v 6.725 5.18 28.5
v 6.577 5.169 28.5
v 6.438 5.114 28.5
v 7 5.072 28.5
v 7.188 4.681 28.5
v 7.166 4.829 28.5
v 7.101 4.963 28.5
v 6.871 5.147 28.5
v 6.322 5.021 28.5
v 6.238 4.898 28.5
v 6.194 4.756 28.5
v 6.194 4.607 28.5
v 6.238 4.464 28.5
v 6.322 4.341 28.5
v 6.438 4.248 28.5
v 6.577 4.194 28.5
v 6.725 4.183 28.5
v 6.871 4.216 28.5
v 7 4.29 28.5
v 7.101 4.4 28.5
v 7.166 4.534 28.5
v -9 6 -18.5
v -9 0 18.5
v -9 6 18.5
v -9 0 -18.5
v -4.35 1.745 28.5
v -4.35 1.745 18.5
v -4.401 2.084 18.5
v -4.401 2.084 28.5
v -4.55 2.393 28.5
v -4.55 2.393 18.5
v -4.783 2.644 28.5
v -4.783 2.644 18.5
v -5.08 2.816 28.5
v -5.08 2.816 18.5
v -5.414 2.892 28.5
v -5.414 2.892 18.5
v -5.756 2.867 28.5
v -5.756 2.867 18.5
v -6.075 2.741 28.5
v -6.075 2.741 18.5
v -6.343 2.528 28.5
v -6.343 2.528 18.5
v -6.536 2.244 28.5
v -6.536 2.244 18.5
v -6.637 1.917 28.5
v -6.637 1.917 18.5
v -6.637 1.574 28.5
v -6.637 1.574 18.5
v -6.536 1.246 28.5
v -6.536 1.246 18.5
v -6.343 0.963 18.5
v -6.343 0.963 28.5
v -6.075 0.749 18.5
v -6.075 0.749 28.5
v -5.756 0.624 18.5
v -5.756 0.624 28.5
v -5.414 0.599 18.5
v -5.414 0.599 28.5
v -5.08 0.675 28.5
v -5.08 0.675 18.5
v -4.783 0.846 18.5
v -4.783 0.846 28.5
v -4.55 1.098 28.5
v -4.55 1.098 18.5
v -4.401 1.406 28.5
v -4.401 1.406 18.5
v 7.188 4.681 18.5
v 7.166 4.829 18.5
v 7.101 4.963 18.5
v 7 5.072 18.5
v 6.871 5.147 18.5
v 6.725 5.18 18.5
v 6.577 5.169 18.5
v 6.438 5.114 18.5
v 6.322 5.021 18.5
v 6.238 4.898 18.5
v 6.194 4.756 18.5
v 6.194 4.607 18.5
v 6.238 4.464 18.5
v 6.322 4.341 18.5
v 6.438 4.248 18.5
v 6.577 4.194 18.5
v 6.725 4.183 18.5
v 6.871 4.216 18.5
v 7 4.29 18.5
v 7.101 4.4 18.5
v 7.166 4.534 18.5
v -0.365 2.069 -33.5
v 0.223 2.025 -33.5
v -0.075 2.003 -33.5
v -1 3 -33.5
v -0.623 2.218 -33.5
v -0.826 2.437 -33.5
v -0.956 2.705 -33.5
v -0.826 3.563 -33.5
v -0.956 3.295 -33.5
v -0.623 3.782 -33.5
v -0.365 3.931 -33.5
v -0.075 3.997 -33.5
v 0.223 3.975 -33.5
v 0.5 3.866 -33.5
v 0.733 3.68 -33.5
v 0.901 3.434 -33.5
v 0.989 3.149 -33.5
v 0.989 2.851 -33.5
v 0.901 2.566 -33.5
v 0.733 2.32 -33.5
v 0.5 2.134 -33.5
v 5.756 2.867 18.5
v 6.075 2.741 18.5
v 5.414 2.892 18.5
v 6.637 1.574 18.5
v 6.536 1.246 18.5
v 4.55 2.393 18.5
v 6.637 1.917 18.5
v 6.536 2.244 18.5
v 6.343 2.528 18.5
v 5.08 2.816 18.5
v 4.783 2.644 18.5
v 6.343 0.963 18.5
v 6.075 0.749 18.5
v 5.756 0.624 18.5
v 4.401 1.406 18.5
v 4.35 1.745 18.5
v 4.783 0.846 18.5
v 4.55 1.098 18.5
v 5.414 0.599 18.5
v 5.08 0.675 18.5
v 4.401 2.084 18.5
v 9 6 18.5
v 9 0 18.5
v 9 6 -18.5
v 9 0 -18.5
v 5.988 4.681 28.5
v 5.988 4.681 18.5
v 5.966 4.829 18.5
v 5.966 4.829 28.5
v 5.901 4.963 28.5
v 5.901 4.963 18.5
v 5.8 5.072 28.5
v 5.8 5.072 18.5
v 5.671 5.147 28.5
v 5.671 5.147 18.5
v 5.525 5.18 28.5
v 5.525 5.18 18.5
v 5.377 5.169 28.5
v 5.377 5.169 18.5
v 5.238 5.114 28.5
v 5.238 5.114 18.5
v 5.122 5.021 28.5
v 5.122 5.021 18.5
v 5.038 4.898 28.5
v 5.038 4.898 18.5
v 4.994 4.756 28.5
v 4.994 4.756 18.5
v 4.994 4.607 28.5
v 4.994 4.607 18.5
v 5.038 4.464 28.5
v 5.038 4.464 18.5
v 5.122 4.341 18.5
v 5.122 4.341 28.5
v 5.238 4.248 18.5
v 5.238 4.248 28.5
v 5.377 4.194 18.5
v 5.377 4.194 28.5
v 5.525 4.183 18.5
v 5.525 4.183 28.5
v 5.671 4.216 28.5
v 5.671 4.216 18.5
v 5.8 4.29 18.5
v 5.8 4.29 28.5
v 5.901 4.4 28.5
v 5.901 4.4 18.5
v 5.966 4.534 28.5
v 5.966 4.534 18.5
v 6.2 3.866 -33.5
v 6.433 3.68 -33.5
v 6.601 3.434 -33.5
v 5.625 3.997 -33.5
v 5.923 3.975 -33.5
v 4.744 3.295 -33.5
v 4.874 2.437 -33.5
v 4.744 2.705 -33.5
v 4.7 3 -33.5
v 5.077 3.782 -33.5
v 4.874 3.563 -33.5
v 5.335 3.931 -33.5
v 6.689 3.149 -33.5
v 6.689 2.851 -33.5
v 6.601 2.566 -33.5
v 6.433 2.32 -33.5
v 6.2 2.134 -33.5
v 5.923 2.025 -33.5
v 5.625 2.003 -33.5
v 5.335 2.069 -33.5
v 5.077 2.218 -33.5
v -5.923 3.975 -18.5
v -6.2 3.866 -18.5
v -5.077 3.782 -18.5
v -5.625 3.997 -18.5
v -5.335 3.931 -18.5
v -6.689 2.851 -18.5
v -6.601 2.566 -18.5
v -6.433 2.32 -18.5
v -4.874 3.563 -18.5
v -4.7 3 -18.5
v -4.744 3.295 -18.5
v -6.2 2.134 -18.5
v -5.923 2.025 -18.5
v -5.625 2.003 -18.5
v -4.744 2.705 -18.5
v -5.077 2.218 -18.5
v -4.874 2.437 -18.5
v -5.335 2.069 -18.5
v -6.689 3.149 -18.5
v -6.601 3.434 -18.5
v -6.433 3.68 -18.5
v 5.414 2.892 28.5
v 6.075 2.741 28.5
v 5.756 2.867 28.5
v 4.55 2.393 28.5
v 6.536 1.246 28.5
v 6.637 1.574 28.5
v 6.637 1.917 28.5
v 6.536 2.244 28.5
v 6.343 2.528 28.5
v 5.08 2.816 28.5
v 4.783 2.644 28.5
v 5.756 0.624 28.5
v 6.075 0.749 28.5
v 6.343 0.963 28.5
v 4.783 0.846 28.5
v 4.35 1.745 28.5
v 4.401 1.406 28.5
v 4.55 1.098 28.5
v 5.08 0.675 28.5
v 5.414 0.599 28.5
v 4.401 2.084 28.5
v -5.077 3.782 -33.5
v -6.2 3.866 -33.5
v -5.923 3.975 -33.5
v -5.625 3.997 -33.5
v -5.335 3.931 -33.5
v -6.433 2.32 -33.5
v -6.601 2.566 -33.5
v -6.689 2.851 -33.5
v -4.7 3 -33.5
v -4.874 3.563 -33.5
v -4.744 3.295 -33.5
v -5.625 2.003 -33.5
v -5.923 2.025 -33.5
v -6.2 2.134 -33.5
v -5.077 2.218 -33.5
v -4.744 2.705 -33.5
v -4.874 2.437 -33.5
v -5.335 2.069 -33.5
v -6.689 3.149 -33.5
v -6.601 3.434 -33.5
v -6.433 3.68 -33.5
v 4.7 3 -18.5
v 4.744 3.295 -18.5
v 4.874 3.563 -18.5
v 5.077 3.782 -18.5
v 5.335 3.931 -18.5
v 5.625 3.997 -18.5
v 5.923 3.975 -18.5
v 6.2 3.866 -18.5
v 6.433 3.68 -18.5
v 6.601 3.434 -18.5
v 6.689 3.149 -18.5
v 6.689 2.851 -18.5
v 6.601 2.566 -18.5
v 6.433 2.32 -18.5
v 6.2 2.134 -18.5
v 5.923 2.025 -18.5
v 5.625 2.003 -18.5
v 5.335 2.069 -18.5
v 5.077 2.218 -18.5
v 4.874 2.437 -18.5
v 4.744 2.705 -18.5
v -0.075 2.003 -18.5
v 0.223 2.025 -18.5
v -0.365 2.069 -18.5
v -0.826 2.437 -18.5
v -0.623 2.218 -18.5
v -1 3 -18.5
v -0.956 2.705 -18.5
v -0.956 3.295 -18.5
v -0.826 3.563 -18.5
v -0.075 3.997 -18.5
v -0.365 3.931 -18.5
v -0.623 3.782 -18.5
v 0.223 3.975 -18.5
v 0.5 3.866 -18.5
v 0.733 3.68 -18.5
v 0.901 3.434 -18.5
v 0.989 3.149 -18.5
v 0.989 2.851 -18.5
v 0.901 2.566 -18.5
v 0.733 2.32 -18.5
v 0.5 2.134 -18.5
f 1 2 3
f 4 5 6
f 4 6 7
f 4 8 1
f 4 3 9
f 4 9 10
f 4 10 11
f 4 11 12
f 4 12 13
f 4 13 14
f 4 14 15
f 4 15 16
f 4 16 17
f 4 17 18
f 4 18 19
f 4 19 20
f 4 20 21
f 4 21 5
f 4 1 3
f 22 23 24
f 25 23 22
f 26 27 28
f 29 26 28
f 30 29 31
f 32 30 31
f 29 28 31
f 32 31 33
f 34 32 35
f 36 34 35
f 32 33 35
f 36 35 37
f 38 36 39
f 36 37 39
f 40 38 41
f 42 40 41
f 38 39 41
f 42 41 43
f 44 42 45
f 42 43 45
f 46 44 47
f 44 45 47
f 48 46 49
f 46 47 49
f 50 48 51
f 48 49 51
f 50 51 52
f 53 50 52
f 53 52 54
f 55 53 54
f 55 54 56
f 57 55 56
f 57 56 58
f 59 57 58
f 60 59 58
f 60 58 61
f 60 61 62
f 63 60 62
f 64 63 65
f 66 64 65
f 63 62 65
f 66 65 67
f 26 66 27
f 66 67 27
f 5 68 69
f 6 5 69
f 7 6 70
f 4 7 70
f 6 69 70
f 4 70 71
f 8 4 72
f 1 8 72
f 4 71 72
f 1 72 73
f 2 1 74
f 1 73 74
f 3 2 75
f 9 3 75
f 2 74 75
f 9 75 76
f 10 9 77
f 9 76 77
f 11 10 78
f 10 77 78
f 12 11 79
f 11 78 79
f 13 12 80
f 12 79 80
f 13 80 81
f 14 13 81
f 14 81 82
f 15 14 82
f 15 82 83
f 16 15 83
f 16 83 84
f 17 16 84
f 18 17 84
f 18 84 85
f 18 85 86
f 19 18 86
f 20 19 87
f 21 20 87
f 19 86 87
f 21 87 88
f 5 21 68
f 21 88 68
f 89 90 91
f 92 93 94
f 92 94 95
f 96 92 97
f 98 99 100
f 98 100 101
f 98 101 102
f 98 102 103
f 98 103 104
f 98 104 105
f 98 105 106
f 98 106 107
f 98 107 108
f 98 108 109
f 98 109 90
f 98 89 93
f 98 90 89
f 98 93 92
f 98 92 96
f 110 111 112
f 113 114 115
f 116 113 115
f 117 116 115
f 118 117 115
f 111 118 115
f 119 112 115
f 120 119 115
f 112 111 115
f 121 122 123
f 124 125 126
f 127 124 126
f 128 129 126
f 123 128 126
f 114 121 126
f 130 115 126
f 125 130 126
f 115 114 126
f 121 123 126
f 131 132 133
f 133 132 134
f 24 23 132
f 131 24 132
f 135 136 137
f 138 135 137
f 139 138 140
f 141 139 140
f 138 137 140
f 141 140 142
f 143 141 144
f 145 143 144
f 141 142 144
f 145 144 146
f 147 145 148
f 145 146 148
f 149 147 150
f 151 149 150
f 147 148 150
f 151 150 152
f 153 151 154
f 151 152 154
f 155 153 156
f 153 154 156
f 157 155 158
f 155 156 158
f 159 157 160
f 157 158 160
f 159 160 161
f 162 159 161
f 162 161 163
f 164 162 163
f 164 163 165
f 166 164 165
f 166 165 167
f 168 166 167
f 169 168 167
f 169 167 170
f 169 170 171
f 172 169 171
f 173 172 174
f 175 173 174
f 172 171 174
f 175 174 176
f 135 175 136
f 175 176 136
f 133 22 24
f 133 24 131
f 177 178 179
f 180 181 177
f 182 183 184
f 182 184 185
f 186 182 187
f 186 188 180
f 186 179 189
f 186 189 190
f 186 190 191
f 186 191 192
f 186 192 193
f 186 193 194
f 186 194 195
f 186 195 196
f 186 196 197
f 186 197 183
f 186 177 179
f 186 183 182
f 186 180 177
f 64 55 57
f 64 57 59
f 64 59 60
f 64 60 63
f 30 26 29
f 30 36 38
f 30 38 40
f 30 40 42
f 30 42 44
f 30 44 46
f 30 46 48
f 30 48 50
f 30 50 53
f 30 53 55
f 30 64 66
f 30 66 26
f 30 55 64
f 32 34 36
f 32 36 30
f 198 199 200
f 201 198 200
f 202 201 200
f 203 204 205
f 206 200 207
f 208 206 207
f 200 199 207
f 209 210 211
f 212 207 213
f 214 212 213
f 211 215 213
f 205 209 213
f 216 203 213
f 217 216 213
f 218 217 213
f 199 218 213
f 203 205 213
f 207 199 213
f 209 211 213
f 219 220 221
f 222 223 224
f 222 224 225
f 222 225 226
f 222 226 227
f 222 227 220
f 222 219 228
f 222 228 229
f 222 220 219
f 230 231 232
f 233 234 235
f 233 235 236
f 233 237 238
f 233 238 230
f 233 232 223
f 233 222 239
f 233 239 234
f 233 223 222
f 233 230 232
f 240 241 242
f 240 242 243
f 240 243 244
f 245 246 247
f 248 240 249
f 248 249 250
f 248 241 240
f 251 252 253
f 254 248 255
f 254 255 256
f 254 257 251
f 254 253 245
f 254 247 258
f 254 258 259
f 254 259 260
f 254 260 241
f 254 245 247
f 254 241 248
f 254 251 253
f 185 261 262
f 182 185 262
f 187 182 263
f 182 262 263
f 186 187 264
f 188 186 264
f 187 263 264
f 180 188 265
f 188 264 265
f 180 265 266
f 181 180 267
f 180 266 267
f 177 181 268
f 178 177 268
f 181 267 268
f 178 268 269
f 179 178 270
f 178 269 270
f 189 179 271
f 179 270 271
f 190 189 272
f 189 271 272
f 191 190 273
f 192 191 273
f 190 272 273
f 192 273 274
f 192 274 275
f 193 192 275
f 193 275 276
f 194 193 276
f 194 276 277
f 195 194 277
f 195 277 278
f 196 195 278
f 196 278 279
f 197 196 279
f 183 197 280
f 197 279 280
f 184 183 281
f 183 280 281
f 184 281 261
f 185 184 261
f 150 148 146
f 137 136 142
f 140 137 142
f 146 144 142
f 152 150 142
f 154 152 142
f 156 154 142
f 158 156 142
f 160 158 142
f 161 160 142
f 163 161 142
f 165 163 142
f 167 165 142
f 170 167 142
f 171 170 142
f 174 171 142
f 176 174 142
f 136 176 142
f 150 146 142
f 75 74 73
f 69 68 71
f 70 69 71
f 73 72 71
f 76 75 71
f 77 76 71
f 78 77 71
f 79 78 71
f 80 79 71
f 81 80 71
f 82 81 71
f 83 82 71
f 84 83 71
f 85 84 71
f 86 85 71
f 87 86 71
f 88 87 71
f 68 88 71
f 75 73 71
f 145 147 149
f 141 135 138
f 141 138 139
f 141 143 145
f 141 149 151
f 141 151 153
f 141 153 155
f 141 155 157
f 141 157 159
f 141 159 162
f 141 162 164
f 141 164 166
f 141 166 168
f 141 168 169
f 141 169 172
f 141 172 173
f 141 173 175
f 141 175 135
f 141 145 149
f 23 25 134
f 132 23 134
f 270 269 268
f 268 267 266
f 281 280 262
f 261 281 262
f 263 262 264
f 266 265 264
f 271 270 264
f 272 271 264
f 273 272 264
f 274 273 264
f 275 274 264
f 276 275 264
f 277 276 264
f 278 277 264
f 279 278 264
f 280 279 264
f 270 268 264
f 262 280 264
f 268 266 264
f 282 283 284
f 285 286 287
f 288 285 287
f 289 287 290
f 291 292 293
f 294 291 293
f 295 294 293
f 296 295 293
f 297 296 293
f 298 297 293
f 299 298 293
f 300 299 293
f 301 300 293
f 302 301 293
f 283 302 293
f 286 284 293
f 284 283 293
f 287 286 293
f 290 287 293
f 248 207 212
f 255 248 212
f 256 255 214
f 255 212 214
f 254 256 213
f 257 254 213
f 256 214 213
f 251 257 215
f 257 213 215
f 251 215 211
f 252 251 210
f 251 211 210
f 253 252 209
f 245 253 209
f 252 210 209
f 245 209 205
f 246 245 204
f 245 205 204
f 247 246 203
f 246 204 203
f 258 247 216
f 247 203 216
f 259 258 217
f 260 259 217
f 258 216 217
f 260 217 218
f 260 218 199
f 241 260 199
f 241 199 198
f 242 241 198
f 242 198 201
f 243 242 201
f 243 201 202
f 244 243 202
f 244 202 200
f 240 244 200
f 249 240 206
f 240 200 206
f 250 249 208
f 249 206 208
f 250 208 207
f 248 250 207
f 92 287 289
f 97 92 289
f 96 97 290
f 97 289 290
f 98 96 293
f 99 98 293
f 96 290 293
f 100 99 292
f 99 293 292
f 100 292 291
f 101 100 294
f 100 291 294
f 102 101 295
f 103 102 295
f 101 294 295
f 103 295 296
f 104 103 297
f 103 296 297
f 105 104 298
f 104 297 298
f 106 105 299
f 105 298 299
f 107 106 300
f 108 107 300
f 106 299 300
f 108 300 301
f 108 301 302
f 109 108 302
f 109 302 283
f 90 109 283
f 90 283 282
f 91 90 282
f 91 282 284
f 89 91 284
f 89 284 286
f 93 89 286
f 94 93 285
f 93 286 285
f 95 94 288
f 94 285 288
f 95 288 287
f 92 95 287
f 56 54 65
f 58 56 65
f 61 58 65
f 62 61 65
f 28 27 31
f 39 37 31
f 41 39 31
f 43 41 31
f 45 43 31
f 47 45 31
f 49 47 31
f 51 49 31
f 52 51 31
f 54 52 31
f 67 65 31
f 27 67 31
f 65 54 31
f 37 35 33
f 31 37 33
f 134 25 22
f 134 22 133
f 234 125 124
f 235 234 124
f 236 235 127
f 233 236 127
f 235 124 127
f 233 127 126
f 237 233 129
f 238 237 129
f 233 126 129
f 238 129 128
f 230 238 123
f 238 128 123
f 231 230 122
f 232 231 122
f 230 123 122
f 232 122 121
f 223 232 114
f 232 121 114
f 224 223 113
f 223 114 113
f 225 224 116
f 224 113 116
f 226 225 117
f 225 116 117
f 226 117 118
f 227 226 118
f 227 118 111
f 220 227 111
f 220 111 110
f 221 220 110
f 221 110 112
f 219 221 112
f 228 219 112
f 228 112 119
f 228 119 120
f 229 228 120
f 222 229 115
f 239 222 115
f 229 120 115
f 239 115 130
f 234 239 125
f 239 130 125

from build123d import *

# Parameters (mm, degrees)
ESQUISSE1_W          = 18
ESQUISSE1_H          = 37
BOSS_EXTRU_1_DEPTH   = 6
ESQUISSE2_R          = 1.15
BOSS_EXTRU_2_DEPTH   = 10
BOSS_EXTRU_2_2_DEPTH = 10
ESQUISSE2_R_2        = 0.5
BOSS_EXTRU_2_3_DEPTH = 10
BOSS_EXTRU_2_4_DEPTH = 10
ESQUISSE3_R          = 1
BOSS_EXTRU_3_DEPTH   = 15
BOSS_EXTRU_3_2_DEPTH = 15
BOSS_EXTRU_3_3_DEPTH = 15


with BuildPart() as part:
    # Esquisse1 → Boss.-Extru.1 (new body)
    with BuildSketch(Plane(origin=(0, 0, 0), x_dir=(1, 0, 0), z_dir=(0, 1, 0))):
        Rectangle(ESQUISSE1_W, ESQUISSE1_H)
    extrude(amount=BOSS_EXTRU_1_DEPTH)


with BuildPart() as body_2:
    # Esquisse2 → Boss.-Extru.2 (new body)
    with BuildSketch(Plane.XY.offset(18.5)):
        with Locations((-5.5, 1.745362632)):
            Circle(ESQUISSE2_R)
    extrude(amount=BOSS_EXTRU_2_DEPTH)


with BuildPart() as body_3:
    # Esquisse2 → Boss.-Extru.2 2 (new body)
    with BuildSketch(Plane.XY.offset(18.5)):
        with Locations(Location((5.5, 1.745362632, 0), (0, 0, 180))):
            Circle(ESQUISSE2_R)
    extrude(amount=BOSS_EXTRU_2_2_DEPTH)


with BuildPart() as body_4:
    # Esquisse2 → Boss.-Extru.2 3 (new body)
    with BuildSketch(Plane.XY.offset(18.5)):
        with Locations((6.688031395, 4.681212966)):
            Circle(ESQUISSE2_R_2)
    extrude(amount=BOSS_EXTRU_2_3_DEPTH)


with BuildPart() as body_5:
    # Esquisse2 → Boss.-Extru.2 4 (new body)
    with BuildSketch(Plane.XY.offset(18.5)):
        with Locations((5.488031395, 4.681212966)):
            Circle(ESQUISSE2_R_2)
    extrude(amount=BOSS_EXTRU_2_4_DEPTH)


with BuildPart() as body_6:
    # Esquisse3 → Boss.-Extru.3 (new body)
    with BuildSketch(Plane(origin=(0, 0, -18.5), x_dir=(-1, 0, 0), z_dir=(0, 0, -1))):
        with Locations((-5.7, 3)):
            Circle(ESQUISSE3_R)
    extrude(amount=BOSS_EXTRU_3_DEPTH)


with BuildPart() as body_7:
    # Esquisse3 → Boss.-Extru.3 2 (new body)
    with BuildSketch(Plane(origin=(0, 0, -18.5), x_dir=(-1, 0, 0), z_dir=(0, 0, -1))):
        with Locations((0, 3)):
            Circle(ESQUISSE3_R)
    extrude(amount=BOSS_EXTRU_3_2_DEPTH)


with BuildPart() as body_8:
    # Esquisse3 → Boss.-Extru.3 3 (new body)
    with BuildSketch(Plane(origin=(0, 0, -18.5), x_dir=(-1, 0, 0), z_dir=(0, 0, -1))):
        with Locations(Location((5.7, 3, 0), (0, 0, 180))):
            Circle(ESQUISSE3_R)
    extrude(amount=BOSS_EXTRU_3_3_DEPTH)


solid = Compound([part.part, body_2.part, body_3.part, body_4.part, body_5.part, body_6.part, body_7.part, body_8.part])
